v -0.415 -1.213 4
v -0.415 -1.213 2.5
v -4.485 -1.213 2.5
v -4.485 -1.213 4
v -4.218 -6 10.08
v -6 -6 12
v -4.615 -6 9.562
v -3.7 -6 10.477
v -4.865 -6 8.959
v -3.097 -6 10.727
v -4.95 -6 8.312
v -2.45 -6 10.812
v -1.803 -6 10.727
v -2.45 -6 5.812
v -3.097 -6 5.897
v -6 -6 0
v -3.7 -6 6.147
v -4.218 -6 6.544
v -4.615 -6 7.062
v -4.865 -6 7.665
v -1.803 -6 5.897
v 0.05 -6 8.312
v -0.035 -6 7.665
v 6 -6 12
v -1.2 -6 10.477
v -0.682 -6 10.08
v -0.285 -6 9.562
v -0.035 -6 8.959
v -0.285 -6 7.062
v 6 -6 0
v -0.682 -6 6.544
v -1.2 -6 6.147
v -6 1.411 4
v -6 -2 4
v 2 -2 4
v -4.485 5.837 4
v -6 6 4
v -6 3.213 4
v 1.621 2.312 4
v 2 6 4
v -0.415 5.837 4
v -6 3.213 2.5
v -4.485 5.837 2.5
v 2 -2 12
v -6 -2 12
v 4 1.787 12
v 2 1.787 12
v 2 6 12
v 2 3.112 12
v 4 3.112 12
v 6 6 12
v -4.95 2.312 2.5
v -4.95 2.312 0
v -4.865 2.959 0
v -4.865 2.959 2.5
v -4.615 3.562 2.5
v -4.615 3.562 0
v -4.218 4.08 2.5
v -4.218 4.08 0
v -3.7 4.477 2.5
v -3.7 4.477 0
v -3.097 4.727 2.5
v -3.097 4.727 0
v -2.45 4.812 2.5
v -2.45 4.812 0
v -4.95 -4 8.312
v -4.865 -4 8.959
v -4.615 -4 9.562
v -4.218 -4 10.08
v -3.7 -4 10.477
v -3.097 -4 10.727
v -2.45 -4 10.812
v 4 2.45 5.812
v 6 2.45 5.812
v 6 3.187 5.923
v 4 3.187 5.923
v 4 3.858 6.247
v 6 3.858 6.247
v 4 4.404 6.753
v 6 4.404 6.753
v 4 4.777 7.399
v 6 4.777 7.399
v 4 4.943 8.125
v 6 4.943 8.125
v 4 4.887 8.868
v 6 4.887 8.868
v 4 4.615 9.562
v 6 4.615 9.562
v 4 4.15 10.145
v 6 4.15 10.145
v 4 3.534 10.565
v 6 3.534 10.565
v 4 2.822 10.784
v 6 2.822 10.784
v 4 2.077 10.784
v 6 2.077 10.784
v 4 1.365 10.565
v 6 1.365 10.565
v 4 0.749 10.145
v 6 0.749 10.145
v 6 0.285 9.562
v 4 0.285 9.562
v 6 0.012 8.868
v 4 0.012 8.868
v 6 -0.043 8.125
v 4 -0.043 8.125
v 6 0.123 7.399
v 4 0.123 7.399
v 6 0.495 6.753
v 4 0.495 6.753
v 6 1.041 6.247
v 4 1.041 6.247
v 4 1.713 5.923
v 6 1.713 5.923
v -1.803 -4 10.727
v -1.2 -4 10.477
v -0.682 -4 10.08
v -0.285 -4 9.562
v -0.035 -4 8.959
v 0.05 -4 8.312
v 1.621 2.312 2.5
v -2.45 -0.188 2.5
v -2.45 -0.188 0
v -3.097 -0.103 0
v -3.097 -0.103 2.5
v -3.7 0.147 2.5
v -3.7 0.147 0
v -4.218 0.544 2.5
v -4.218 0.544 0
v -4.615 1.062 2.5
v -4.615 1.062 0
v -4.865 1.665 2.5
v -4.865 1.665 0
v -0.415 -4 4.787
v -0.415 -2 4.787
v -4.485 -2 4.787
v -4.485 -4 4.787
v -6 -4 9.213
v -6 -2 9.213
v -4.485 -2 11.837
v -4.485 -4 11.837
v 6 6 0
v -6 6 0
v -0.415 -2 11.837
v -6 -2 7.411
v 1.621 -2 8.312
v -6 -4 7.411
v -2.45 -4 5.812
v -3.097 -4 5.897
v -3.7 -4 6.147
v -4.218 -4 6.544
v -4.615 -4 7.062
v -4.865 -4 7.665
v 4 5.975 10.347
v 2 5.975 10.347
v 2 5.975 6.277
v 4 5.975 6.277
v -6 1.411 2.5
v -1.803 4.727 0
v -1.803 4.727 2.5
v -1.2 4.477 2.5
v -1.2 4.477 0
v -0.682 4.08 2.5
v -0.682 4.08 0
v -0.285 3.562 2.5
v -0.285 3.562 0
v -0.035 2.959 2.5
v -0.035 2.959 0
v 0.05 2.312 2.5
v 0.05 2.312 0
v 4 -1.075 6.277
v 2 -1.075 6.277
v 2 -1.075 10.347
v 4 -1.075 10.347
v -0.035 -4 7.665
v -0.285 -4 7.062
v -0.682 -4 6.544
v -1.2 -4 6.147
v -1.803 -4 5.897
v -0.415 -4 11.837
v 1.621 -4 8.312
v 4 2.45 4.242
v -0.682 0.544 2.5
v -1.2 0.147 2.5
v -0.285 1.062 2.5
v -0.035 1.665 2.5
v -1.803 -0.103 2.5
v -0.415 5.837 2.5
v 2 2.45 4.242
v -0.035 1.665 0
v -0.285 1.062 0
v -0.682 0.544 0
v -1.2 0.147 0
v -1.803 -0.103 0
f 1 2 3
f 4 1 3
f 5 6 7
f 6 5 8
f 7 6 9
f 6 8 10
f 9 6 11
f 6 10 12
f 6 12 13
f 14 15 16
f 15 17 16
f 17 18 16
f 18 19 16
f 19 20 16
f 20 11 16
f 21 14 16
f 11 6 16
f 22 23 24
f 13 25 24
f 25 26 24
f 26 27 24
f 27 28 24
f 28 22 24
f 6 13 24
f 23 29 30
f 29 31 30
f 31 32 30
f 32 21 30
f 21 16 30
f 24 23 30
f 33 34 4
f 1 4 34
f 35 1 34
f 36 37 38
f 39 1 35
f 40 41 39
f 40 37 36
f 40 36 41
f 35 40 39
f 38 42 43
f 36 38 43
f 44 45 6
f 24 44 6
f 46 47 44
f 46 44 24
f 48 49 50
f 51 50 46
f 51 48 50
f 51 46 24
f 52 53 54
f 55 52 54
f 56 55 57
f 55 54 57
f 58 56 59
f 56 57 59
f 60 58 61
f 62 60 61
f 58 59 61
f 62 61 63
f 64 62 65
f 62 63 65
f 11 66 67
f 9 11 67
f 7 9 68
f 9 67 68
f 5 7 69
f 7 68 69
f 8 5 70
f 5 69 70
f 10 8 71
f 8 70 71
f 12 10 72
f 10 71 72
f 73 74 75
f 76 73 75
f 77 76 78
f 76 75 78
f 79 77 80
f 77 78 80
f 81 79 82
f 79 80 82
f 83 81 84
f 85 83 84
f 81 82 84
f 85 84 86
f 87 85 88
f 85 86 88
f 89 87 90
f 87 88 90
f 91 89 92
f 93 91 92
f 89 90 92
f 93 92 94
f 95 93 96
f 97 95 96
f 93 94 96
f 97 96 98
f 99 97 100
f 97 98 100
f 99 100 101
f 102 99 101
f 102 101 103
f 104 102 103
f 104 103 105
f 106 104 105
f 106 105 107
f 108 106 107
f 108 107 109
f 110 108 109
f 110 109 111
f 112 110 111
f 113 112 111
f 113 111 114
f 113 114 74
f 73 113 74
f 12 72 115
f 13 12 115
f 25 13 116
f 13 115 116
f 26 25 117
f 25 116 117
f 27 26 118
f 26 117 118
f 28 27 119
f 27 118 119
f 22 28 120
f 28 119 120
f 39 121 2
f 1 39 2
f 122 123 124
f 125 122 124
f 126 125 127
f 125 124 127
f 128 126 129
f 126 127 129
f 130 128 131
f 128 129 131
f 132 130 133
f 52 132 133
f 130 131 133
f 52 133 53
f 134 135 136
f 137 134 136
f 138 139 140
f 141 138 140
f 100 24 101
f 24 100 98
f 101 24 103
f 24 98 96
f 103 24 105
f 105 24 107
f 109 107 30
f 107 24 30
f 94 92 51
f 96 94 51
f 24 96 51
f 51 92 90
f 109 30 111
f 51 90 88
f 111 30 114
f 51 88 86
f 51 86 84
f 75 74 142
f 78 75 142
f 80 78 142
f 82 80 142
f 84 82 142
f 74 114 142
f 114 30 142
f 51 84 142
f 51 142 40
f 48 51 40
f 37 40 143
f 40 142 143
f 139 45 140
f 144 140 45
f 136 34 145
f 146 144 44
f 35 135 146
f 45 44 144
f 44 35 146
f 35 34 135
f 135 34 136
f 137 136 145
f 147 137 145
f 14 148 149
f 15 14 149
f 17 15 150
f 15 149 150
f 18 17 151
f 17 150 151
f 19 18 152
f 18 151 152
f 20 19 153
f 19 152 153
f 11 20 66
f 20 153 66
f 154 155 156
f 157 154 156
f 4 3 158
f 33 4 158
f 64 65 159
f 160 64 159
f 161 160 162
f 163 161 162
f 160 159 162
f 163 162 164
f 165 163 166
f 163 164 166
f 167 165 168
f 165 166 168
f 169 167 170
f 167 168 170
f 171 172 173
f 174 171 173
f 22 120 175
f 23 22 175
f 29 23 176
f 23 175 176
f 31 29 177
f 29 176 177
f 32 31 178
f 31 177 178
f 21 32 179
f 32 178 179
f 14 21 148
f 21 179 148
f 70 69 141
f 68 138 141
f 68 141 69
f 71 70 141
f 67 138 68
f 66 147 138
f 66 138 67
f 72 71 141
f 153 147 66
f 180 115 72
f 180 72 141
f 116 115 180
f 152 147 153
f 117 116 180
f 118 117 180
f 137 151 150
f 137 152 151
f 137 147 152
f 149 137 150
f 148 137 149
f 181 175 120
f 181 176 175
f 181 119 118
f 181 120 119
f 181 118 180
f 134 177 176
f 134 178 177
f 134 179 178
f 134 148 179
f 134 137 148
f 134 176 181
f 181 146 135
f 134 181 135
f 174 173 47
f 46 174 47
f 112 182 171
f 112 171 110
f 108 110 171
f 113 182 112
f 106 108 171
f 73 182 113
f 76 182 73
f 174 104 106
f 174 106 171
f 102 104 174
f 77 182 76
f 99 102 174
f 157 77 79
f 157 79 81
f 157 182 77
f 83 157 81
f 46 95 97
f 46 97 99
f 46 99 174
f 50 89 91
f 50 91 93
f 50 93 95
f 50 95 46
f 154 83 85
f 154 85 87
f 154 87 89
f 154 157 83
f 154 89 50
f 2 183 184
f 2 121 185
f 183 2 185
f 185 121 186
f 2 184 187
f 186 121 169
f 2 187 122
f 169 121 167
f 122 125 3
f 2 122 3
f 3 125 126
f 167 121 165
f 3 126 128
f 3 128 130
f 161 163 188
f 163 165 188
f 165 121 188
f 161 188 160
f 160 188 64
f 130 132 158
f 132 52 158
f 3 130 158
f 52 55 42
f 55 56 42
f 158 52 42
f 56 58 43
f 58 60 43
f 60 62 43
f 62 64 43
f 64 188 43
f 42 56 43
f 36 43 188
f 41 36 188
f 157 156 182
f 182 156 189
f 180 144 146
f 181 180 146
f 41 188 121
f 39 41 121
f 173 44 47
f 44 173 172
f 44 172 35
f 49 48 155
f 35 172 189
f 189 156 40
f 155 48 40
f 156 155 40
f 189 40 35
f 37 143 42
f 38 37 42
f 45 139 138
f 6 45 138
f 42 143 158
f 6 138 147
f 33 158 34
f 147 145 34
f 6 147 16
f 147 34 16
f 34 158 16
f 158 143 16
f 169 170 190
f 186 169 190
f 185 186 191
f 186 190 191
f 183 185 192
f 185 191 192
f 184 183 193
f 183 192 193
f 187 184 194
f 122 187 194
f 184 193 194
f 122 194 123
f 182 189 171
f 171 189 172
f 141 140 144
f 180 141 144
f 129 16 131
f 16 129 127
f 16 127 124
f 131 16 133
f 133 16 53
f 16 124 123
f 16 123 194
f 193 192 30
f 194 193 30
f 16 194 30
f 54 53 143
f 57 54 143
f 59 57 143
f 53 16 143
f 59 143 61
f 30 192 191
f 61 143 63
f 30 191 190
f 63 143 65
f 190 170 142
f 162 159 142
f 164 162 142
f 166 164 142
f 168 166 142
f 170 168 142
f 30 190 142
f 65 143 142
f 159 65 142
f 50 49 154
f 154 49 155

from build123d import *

# Parameters (mm, degrees)
BOSS_EXTRUDE1_DEPTH = 12
SKETCH3_W           = 8
SKETCH3_H           = 8
CUT_EXTRUDE1_DEPTH  = 8
CUT_EXTRUDE8_DEPTH  = 16.620499352
SKETCH8_R           = 2.5
CUT_EXTRUDE9_DEPTH  = 19
CUT_EXTRUDE10_DEPTH = 15.696938457
CUT_EXTRUDE11_START = -2.5
CUT_EXTRUDE11_DEPTH = 10
CUT_EXTRUDE13_DEPTH = 2
CUT_EXTRUDE14_DEPTH = 2


with BuildPart() as part:
    # Sketch2 → Boss-Extrude1 (new body)
    with BuildSketch(Plane.XY):
        with BuildLine():
            Line((2.31217259, 6), (-6, 6))
            Line((-6, 6), (-6, -2.44974747))
            Line((-6, -2.44974747), (0.26217259, -2.44974747))
            ThreePointArc((0.26217259, -2.44974747), (0.862603689, -1.000178569), (2.31217259, -0.39974747))
            Line((2.31217259, -0.39974747), (2.31217259, 6))
        make_face()
        with BuildLine():
            Line((6, 6), (2.31217259, 6))
            Line((2.31217259, 6), (2.31217259, -0.39974747))
            ThreePointArc((2.31217259, -0.39974747), (3.761741491, -1.000178569), (4.36217259, -2.44974747))
            Line((4.36217259, -2.44974747), (6, -2.44974747))
            Line((6, -2.44974747), (6, 6))
        make_face()
        with BuildLine():
            ThreePointArc((2.31217259, -0.39974747), (0.862603689, -1.000178569), (0.26217259, -2.44974747))
            Line((0.26217259, -2.44974747), (2.31217259, -2.44974747))
            Line((2.31217259, -2.44974747), (2.31217259, -0.39974747))
        make_face()
        with BuildLine():
            Line((2.31217259, -2.44974747), (0.26217259, -2.44974747))
            ThreePointArc((0.26217259, -2.44974747), (0.862603689, -3.899316371), (2.31217259, -4.49974747))
            Line((2.31217259, -4.49974747), (2.31217259, -2.44974747))
        make_face()
        with BuildLine():
            ThreePointArc((4.36217259, -2.44974747), (3.761741491, -1.000178569), (2.31217259, -0.39974747))
            Line((2.31217259, -0.39974747), (2.31217259, -2.44974747))
            Line((2.31217259, -2.44974747), (4.36217259, -2.44974747))
        make_face()
        with BuildLine():
            Line((4.36217259, -2.44974747), (2.31217259, -2.44974747))
            Line((2.31217259, -2.44974747), (2.31217259, -4.49974747))
            ThreePointArc((2.31217259, -4.49974747), (3.761741491, -3.899316371), (4.36217259, -2.44974747))
        make_face()
        with BuildLine():
            Line((2.31217259, -4.49974747), (2.31217259, -6))
            Line((2.31217259, -6), (6, -6))
            Line((6, -6), (6, -2.44974747))
            Line((6, -2.44974747), (4.36217259, -2.44974747))
            ThreePointArc((4.36217259, -2.44974747), (3.761741491, -3.899316371), (2.31217259, -4.49974747))
        make_face()
        with BuildLine():
            Line((0.26217259, -2.44974747), (-6, -2.44974747))
            Line((-6, -2.44974747), (-6, -6))
            Line((-6, -6), (2.31217259, -6))
            Line((2.31217259, -6), (2.31217259, -4.49974747))
            ThreePointArc((2.31217259, -4.49974747), (0.862603689, -3.899316371), (0.26217259, -2.44974747))
        make_face()
    extrude(amount=BOSS_EXTRUDE1_DEPTH)

    # Sketch3 → Cut-Extrude1 (cut)
    with BuildSketch(Plane(origin=(0, 6, 0), x_dir=(1, 0, 0), z_dir=(0, 1, 0))):
        with Locations((-2, -8)):
            Rectangle(SKETCH3_W, SKETCH3_H)
    extrude(amount=-CUT_EXTRUDE1_DEPTH, mode=Mode.SUBTRACT)

    # Sketch6 → Cut-Extrude8 (cut, through all)
    with BuildSketch(Plane(origin=(0, -2, 0), x_dir=(1, 0, 0), z_dir=(0, 1, 0))):
        with BuildLine():
            ThreePointArc((0.05025253, -8.31217259), (-0.681980517, -6.544405637), (-2.44974747, -5.81217259))
            Line((-2.44974747, -5.81217259), (-2.44974747, -8.31217259))
            Line((-2.44974747, -8.31217259), (0.05025253, -8.31217259))
        make_face()
        with BuildLine():
            Line((-2.44974747, -8.31217259), (-2.44974747, -5.81217259))
            ThreePointArc((-2.44974747, -5.81217259), (-4.217514423, -6.544405637), (-4.94974747, -8.31217259))
            Line((-4.94974747, -8.31217259), (-2.44974747, -8.31217259))
        make_face()
        with BuildLine():
            ThreePointArc((-2.44974747, -10.81217259), (-0.681980517, -10.079939543), (0.05025253, -8.31217259))
            Line((0.05025253, -8.31217259), (-2.44974747, -8.31217259))
            Line((-2.44974747, -8.31217259), (-2.44974747, -10.81217259))
        make_face()
        with BuildLine():
            Line((-2.44974747, -10.81217259), (-2.44974747, -8.31217259))
            Line((-2.44974747, -8.31217259), (-4.94974747, -8.31217259))
            ThreePointArc((-4.94974747, -8.31217259), (-4.217514423, -10.079939543), (-2.44974747, -10.81217259))
        make_face()
    extrude(amount=-CUT_EXTRUDE8_DEPTH, mode=Mode.SUBTRACT)

    # Sketch8 → Cut-Extrude9 (cut, through all)
    with BuildSketch(Plane(origin=(6, 0, 0), x_dir=(0, 0, -1), z_dir=(1, 0, 0))):
        with Locations((-8.31217259, 2.44974747)):
            Circle(SKETCH8_R)
    extrude(amount=-CUT_EXTRUDE9_DEPTH, mode=Mode.SUBTRACT)

    # Sketch7 → Cut-Extrude10 (cut, through all)
    with BuildSketch(Plane(origin=(0, 0, 0), x_dir=(-1, 0, 0), z_dir=(0, 0, -1))):
        with BuildLine():
            ThreePointArc((-0.05025253, 2.31217259), (0.681980517, 0.544405637), (2.44974747, -0.18782741))
            Line((2.44974747, -0.18782741), (2.44974747, 2.31217259))
            Line((2.44974747, 2.31217259), (-0.05025253, 2.31217259))
        make_face()
        with BuildLine():
            Line((2.44974747, 2.31217259), (2.44974747, -0.18782741))
            ThreePointArc((2.44974747, -0.18782741), (4.217514423, 0.544405637), (4.94974747, 2.31217259))
            Line((4.94974747, 2.31217259), (2.44974747, 2.31217259))
        make_face()
        with BuildLine():
            ThreePointArc((2.44974747, 4.81217259), (0.681980517, 4.079939543), (-0.05025253, 2.31217259))
            Line((-0.05025253, 2.31217259), (2.44974747, 2.31217259))
            Line((2.44974747, 2.31217259), (2.44974747, 4.81217259))
        make_face()
        with BuildLine():
            Line((2.44974747, 4.81217259), (2.44974747, 2.31217259))
            Line((2.44974747, 2.31217259), (4.94974747, 2.31217259))
            ThreePointArc((4.94974747, 2.31217259), (4.217514423, 4.079939543), (2.44974747, 4.81217259))
        make_face()
    extrude(amount=-CUT_EXTRUDE10_DEPTH, mode=Mode.SUBTRACT)

    # Sketch14 → Cut-Extrude11 (cut)
    with BuildSketch(Plane(origin=(0, 0, 0), x_dir=(-1, 0, 0), z_dir=(0, 0, -1)).offset(CUT_EXTRUDE11_START)):
        Polygon((6.520066868, 2.31217259), (4.484907169, 5.83717259), (0.414587771, 5.83717259), (-1.620571928, 2.31217259), (0.414587771, -1.21282741), (4.484907169, -1.21282741), align=None)
    extrude(amount=-CUT_EXTRUDE11_DEPTH, mode=Mode.SUBTRACT)

    # Sketch15 → Cut-Extrude13 (cut)
    with BuildSketch(Plane(origin=(0, -2, 0), x_dir=(1, 0, 0), z_dir=(0, 1, 0))):
        Polygon((1.620571928, -8.31217259), (-0.414587771, -4.78717259), (-4.484907169, -4.78717259), (-6.520066868, -8.31217259), (-4.484907169, -11.83717259), (-0.414587771, -11.83717259), align=None)
    extrude(amount=-CUT_EXTRUDE13_DEPTH, mode=Mode.SUBTRACT)

    # Sketch16 → Cut-Extrude14 (cut)
    with BuildSketch(Plane.ZY.offset(-2)):
        Polygon((12.382491988, 2.44974747), (10.347332289, 5.97474747), (6.277012891, 5.97474747), (4.241853192, 2.44974747), (6.277012891, -1.07525253), (10.347332289, -1.07525253), align=None)
    extrude(amount=-CUT_EXTRUDE14_DEPTH, mode=Mode.SUBTRACT)


solid = part.part
